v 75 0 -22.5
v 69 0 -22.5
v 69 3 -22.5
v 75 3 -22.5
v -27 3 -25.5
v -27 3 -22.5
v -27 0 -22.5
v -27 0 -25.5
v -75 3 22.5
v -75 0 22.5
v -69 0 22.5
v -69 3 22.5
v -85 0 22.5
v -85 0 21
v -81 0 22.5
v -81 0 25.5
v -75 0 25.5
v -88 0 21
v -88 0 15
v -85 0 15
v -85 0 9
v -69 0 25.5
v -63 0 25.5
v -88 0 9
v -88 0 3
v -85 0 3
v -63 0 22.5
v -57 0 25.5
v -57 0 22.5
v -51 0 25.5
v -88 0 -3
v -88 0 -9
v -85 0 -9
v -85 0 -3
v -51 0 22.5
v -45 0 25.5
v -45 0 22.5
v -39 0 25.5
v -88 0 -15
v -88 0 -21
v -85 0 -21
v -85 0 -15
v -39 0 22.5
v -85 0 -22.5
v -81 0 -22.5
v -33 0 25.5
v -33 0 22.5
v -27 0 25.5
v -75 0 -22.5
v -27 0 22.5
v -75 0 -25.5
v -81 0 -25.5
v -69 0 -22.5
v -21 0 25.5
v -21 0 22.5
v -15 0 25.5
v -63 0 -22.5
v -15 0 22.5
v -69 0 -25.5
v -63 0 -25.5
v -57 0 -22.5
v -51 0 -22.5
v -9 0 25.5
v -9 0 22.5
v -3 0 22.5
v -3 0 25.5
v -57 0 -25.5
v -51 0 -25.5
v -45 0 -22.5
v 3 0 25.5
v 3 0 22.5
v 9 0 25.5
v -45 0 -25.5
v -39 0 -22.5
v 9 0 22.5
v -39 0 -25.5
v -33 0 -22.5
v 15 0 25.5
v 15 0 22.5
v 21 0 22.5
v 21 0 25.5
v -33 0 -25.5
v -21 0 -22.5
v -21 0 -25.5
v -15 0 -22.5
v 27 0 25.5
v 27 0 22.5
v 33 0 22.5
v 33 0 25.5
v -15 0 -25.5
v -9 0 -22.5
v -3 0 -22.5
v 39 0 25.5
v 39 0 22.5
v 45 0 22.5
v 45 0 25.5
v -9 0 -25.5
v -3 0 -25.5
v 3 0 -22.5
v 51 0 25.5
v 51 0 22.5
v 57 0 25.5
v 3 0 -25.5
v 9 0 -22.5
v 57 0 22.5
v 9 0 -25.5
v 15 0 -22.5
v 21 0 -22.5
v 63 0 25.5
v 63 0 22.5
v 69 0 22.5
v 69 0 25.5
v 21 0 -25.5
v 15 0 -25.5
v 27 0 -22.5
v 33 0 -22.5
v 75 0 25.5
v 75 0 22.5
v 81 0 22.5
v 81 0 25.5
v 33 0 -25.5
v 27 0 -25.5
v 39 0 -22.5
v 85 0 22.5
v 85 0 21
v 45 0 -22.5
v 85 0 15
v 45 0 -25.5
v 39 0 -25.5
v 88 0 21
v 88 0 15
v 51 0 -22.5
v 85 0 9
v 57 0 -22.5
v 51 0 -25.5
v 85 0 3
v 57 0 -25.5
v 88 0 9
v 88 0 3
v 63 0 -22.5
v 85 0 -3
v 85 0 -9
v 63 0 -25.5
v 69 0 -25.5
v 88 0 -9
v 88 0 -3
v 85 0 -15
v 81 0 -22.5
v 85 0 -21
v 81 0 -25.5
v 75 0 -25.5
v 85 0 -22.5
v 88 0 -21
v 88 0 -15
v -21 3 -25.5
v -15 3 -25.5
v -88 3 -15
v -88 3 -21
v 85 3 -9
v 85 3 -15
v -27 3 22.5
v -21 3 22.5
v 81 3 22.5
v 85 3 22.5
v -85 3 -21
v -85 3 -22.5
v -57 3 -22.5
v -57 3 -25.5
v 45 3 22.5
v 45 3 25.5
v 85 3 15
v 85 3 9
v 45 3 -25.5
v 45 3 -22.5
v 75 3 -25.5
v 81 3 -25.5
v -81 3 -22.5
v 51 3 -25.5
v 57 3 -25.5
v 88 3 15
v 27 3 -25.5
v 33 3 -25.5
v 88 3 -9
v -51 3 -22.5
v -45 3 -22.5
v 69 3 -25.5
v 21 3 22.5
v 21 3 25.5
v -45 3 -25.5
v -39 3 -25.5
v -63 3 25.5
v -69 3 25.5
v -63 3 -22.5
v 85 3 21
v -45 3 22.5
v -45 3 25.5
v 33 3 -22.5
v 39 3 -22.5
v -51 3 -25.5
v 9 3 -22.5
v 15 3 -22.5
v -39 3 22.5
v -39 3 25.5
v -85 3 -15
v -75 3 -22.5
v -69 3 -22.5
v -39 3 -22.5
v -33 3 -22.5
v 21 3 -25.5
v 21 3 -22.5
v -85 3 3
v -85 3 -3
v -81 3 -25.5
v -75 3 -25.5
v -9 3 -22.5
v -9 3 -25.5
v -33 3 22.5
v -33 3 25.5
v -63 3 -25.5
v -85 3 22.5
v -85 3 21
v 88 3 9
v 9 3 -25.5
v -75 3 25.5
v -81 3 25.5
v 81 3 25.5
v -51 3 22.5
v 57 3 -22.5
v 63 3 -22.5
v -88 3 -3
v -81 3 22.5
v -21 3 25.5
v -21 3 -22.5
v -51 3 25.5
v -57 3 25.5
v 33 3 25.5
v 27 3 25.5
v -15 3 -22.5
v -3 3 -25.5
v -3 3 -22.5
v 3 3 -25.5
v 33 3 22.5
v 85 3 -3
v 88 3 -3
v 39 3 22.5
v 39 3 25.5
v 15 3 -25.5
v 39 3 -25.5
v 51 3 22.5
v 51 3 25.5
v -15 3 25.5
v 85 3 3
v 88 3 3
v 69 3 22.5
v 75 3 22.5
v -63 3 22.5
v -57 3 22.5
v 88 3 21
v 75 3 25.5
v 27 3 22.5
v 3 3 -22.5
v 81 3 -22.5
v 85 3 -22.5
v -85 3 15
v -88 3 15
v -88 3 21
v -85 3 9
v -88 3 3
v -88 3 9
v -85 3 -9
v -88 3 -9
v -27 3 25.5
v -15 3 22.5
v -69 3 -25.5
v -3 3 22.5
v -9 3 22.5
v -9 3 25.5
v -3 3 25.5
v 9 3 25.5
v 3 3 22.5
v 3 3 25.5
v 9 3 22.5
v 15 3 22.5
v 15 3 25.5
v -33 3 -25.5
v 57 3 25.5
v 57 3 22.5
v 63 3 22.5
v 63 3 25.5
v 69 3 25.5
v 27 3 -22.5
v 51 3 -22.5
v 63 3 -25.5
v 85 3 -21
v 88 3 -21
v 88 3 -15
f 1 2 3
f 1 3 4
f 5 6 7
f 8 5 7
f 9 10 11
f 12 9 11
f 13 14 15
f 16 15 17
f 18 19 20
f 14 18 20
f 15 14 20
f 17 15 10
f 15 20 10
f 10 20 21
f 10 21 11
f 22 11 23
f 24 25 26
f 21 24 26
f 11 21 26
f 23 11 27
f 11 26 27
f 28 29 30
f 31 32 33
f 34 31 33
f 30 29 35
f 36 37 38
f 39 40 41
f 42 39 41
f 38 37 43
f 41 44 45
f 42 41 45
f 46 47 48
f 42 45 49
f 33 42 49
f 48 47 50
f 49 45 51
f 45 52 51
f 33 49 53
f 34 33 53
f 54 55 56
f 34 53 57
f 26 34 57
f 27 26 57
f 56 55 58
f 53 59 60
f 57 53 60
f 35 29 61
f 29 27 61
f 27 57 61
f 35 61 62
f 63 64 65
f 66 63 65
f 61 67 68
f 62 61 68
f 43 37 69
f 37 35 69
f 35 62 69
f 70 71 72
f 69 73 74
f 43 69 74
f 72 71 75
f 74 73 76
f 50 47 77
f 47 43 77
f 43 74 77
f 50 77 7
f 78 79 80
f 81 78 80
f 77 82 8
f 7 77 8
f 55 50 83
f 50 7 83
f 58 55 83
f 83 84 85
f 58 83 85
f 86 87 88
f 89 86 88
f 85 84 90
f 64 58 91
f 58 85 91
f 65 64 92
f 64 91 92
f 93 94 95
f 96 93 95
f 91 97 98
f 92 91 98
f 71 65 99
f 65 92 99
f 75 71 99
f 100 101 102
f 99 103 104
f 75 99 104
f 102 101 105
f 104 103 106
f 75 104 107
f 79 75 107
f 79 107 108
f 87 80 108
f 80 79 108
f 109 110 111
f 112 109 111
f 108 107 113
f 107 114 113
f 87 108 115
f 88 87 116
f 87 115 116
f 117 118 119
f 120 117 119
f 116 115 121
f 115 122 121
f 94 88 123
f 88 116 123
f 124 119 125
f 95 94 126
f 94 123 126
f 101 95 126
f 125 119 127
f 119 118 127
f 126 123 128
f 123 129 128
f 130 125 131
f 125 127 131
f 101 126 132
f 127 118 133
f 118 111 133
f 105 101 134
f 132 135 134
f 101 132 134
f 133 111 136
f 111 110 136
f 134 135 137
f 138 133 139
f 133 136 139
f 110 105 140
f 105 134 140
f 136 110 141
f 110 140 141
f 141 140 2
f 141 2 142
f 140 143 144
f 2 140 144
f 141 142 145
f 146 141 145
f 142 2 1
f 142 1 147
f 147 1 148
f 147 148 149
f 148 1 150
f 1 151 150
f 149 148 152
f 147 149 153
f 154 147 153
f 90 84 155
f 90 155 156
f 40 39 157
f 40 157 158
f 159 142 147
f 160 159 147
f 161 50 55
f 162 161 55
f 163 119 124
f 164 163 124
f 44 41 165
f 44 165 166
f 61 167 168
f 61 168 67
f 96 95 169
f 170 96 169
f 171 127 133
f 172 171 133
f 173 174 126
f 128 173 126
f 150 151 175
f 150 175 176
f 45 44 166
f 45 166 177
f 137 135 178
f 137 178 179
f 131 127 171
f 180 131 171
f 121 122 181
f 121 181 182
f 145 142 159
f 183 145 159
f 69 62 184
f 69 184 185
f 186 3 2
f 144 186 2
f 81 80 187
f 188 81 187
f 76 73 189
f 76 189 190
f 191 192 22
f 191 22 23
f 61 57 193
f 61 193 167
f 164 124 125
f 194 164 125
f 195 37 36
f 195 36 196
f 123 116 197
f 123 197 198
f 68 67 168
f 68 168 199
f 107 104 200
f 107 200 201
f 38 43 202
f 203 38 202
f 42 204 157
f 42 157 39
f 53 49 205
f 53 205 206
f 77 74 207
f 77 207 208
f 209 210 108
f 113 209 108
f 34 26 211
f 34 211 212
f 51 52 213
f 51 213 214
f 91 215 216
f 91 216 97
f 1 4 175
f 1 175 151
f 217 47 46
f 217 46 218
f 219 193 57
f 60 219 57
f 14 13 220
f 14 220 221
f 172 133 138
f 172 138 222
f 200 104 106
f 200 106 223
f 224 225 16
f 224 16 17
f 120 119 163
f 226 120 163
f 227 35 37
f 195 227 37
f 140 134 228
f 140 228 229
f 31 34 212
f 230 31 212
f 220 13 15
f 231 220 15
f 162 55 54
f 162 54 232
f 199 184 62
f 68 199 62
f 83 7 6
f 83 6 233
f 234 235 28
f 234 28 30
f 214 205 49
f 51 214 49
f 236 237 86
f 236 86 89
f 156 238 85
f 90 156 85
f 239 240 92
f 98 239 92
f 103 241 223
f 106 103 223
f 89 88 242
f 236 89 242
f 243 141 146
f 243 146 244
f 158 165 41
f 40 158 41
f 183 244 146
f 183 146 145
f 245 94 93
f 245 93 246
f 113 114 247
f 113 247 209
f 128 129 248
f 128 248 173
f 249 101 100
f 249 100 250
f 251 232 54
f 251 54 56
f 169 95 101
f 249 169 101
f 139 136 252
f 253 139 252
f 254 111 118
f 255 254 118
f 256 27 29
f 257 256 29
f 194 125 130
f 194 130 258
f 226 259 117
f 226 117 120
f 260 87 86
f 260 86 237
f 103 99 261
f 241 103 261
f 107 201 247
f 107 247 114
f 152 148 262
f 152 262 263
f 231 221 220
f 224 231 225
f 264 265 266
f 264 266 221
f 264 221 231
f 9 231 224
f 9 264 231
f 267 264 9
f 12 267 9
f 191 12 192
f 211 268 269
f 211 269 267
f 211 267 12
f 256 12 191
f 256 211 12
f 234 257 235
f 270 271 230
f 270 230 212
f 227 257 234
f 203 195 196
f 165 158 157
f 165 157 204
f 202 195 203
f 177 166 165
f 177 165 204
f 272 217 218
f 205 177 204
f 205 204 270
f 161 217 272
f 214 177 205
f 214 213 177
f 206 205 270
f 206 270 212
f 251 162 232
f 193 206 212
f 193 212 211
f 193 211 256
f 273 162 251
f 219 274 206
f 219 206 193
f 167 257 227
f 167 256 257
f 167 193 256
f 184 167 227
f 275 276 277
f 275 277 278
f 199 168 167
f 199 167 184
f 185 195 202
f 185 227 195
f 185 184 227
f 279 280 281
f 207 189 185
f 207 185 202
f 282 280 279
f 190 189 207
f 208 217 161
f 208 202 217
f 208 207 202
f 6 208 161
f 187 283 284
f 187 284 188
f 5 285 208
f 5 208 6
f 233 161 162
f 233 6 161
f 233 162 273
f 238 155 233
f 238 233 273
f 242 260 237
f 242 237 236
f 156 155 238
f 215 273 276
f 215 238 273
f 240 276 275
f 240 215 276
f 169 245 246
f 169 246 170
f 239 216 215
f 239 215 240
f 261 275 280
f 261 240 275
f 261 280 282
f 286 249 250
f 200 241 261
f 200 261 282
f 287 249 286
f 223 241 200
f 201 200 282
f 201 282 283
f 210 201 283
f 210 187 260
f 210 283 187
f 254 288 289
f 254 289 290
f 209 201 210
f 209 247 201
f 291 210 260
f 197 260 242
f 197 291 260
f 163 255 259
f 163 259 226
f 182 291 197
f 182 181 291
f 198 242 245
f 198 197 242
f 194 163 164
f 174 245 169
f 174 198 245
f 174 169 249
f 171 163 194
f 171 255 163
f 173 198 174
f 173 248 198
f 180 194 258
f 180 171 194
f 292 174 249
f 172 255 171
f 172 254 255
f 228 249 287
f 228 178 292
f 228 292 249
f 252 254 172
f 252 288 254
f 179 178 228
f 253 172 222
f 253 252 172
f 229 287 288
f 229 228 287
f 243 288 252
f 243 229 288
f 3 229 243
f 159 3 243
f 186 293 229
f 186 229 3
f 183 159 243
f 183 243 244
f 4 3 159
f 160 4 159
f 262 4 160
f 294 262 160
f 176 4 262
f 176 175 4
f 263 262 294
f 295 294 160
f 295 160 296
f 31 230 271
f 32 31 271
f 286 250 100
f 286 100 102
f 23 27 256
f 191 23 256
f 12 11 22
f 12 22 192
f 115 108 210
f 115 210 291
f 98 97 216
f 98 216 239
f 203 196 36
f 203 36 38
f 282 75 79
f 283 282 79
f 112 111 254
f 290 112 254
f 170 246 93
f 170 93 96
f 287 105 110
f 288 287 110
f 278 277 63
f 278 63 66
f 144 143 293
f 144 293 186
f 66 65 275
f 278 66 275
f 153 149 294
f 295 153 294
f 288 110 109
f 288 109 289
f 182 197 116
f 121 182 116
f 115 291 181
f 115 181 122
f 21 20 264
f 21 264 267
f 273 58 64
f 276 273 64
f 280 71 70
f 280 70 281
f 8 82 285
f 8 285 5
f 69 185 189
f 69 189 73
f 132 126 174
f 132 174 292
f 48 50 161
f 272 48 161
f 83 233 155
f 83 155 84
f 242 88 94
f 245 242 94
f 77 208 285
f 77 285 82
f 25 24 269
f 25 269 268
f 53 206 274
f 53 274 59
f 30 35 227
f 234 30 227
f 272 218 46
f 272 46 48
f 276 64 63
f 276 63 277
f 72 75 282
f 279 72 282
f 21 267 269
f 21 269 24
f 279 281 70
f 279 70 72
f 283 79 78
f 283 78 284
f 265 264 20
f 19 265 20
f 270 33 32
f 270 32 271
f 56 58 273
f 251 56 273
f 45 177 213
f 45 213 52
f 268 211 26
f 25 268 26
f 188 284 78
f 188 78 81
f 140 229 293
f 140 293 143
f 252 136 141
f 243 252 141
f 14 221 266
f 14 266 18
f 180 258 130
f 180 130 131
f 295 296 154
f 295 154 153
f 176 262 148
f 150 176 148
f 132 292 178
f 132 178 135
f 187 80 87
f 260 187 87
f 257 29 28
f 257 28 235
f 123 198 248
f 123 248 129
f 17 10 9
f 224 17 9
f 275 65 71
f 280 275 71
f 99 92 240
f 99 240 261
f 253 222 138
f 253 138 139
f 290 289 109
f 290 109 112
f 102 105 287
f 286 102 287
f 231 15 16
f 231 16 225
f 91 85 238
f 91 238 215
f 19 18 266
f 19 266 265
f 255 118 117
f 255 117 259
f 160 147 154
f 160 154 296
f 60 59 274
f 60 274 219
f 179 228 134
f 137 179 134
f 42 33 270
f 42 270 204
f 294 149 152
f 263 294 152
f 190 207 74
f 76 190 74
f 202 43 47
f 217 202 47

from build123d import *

# Parameters (mm, degrees)
SKETCH1_W                = 170
SKETCH1_H                = 45
BOSS_EXTRUDE1_DEPTH      = 3
SKETCH2_W                = 6
SKETCH2_H                = 3
BOSS_EXTRUDE2_DEPTH      = 3
LPATTERN1_COUNT          = 7
LPATTERN1_PITCH          = 12
LPATTERN1_COL_COUNT      = 8
LPATTERN1_COL_PITCH      = 12
SKETCH3_W                = 6
SKETCH3_H                = 3
BOSS_EXTRUDE3_DEPTH      = 3
LPATTERN2_COUNT          = 2
LPATTERN2_PITCH          = 12
LPATTERN2_COL_COUNT      = 3
LPATTERN2_COL_PITCH      = 12
MIRROR1_COPY_1_SKETCH_W  = 6
MIRROR1_COPY_1_SKETCH_H  = 3
MIRROR1_COPY_1_DEPTH     = 3
MIRROR1_COPY_2_SKETCH_W  = 6
MIRROR1_COPY_2_SKETCH_H  = 3
MIRROR1_COPY_2_DEPTH     = 3
MIRROR1_COPY_3_SKETCH_W  = 6
MIRROR1_COPY_3_SKETCH_H  = 3
MIRROR1_COPY_3_DEPTH     = 3
MIRROR1_COPY_4_SKETCH_W  = 6
MIRROR1_COPY_4_SKETCH_H  = 3
MIRROR1_COPY_4_DEPTH     = 3
MIRROR1_COPY_5_SKETCH_W  = 6
MIRROR1_COPY_5_SKETCH_H  = 3
MIRROR1_COPY_5_DEPTH     = 3
MIRROR1_COPY_6_SKETCH_W  = 6
MIRROR1_COPY_6_SKETCH_H  = 3
MIRROR1_COPY_6_DEPTH     = 3
MIRROR1_COPY_7_SKETCH_W  = 6
MIRROR1_COPY_7_SKETCH_H  = 3
MIRROR1_COPY_7_DEPTH     = 3
MIRROR1_COPY_8_SKETCH_W  = 6
MIRROR1_COPY_8_SKETCH_H  = 3
MIRROR1_COPY_8_DEPTH     = 3
MIRROR1_COPY_9_SKETCH_W  = 6
MIRROR1_COPY_9_SKETCH_H  = 3
MIRROR1_COPY_9_DEPTH     = 3
MIRROR1_COPY_10_SKETCH_W = 6
MIRROR1_COPY_10_SKETCH_H = 3
MIRROR1_COPY_10_DEPTH    = 3
MIRROR1_COPY_11_SKETCH_W = 6
MIRROR1_COPY_11_SKETCH_H = 3
MIRROR1_COPY_11_DEPTH    = 3
MIRROR1_COPY_12_SKETCH_W = 6
MIRROR1_COPY_12_SKETCH_H = 3
MIRROR1_COPY_12_DEPTH    = 3
MIRROR1_COPY_13_SKETCH_W = 6
MIRROR1_COPY_13_SKETCH_H = 3
MIRROR1_COPY_13_DEPTH    = 3
MIRROR2_COPY_1_SKETCH_W  = 6
MIRROR2_COPY_1_SKETCH_H  = 3
MIRROR2_COPY_1_DEPTH     = 3
MIRROR2_COPY_2_SKETCH_W  = 6
MIRROR2_COPY_2_SKETCH_H  = 3
MIRROR2_COPY_2_DEPTH     = 3
MIRROR2_COPY_3_SKETCH_W  = 6
MIRROR2_COPY_3_SKETCH_H  = 3
MIRROR2_COPY_3_DEPTH     = 3


with BuildPart() as part:
    # Sketch1 → Boss-Extrude1 (new body)
    with BuildSketch(Plane(origin=(0, 0, 0), x_dir=(1, 0, 0), z_dir=(0, 1, 0))):
        Rectangle(SKETCH1_W, SKETCH1_H)
    extrude(amount=BOSS_EXTRUDE1_DEPTH)

    # Sketch2 → Boss-Extrude2 (add)
    with BuildSketch(Plane.XY.offset(22.5)):
        with Locations((6, 1.5)):
            Rectangle(SKETCH2_W, SKETCH2_H)
    boss_extrude2 = extrude(amount=BOSS_EXTRUDE2_DEPTH)

    # LPattern1: Boss-Extrude2 ×7
    with Locations(*[(i * LPATTERN1_PITCH, 0, 0) for i in range(1, LPATTERN1_COUNT)]):
        add(boss_extrude2)

    # LPattern1 col: Boss-Extrude2 ×8
    with Locations(*[(-i * LPATTERN1_COL_PITCH, 0, 0) for i in range(1, LPATTERN1_COL_COUNT)]):
        add(boss_extrude2)

    # Sketch3 → Boss-Extrude3 (add)
    with BuildSketch(Plane(origin=(85, 0, 0), x_dir=(0, 0, -1), z_dir=(1, 0, 0))):
        with Locations((6, 1.5)):
            Rectangle(SKETCH3_W, SKETCH3_H)
    boss_extrude3 = extrude(amount=BOSS_EXTRUDE3_DEPTH)

    # LPattern2: Boss-Extrude3 ×2
    with Locations(*[(0, 0, -i * LPATTERN2_PITCH) for i in range(1, LPATTERN2_COUNT)]):
        add(boss_extrude3)

    # LPattern2 col: Boss-Extrude3 ×3
    with Locations(*[(0, 0, i * LPATTERN2_COL_PITCH) for i in range(1, LPATTERN2_COL_COUNT)]):
        add(boss_extrude3)

    # Mirror1: Boss-Extrude2 across plane
    add(boss_extrude2.mirror(Plane(origin=(0, 0, 0), x_dir=(1, 0, 0), z_dir=(0, 0, -1))))

    # Mirror1 copy 1 sketch → Mirror1 copy 1 (add)
    with BuildSketch(Plane(origin=(12, 0, -22.5), x_dir=(1, 0, 0), z_dir=(0, 0, -1))):
        with Locations((6, -1.5)):
            Rectangle(MIRROR1_COPY_1_SKETCH_W, MIRROR1_COPY_1_SKETCH_H)
    extrude(amount=MIRROR1_COPY_1_DEPTH)

    # Mirror1 copy 2 sketch → Mirror1 copy 2 (add)
    with BuildSketch(Plane(origin=(24, 0, -22.5), x_dir=(1, 0, 0), z_dir=(0, 0, -1))):
        with Locations((6, -1.5)):
            Rectangle(MIRROR1_COPY_2_SKETCH_W, MIRROR1_COPY_2_SKETCH_H)
    extrude(amount=MIRROR1_COPY_2_DEPTH)

    # Mirror1 copy 3 sketch → Mirror1 copy 3 (add)
    with BuildSketch(Plane(origin=(36, 0, -22.5), x_dir=(1, 0, 0), z_dir=(0, 0, -1))):
        with Locations((6, -1.5)):
            Rectangle(MIRROR1_COPY_3_SKETCH_W, MIRROR1_COPY_3_SKETCH_H)
    extrude(amount=MIRROR1_COPY_3_DEPTH)

    # Mirror1 copy 4 sketch → Mirror1 copy 4 (add)
    with BuildSketch(Plane(origin=(48, 0, -22.5), x_dir=(1, 0, 0), z_dir=(0, 0, -1))):
        with Locations((6, -1.5)):
            Rectangle(MIRROR1_COPY_4_SKETCH_W, MIRROR1_COPY_4_SKETCH_H)
    extrude(amount=MIRROR1_COPY_4_DEPTH)

    # Mirror1 copy 5 sketch → Mirror1 copy 5 (add)
    with BuildSketch(Plane(origin=(60, 0, -22.5), x_dir=(1, 0, 0), z_dir=(0, 0, -1))):
        with Locations((6, -1.5)):
            Rectangle(MIRROR1_COPY_5_SKETCH_W, MIRROR1_COPY_5_SKETCH_H)
    extrude(amount=MIRROR1_COPY_5_DEPTH)

    # Mirror1 copy 6 sketch → Mirror1 copy 6 (add)
    with BuildSketch(Plane(origin=(72, 0, -22.5), x_dir=(1, 0, 0), z_dir=(0, 0, -1))):
        with Locations((6, -1.5)):
            Rectangle(MIRROR1_COPY_6_SKETCH_W, MIRROR1_COPY_6_SKETCH_H)
    extrude(amount=MIRROR1_COPY_6_DEPTH)

    # Mirror1 copy 7 sketch → Mirror1 copy 7 (add)
    with BuildSketch(Plane(origin=(-12, 0, -22.5), x_dir=(1, 0, 0), z_dir=(0, 0, -1))):
        with Locations((6, -1.5)):
            Rectangle(MIRROR1_COPY_7_SKETCH_W, MIRROR1_COPY_7_SKETCH_H)
    extrude(amount=MIRROR1_COPY_7_DEPTH)

    # Mirror1 copy 8 sketch → Mirror1 copy 8 (add)
    with BuildSketch(Plane(origin=(-24, 0, -22.5), x_dir=(1, 0, 0), z_dir=(0, 0, -1))):
        with Locations((6, -1.5)):
            Rectangle(MIRROR1_COPY_8_SKETCH_W, MIRROR1_COPY_8_SKETCH_H)
    extrude(amount=MIRROR1_COPY_8_DEPTH)

    # Mirror1 copy 9 sketch → Mirror1 copy 9 (add)
    with BuildSketch(Plane(origin=(-36, 0, -22.5), x_dir=(1, 0, 0), z_dir=(0, 0, -1))):
        with Locations((6, -1.5)):
            Rectangle(MIRROR1_COPY_9_SKETCH_W, MIRROR1_COPY_9_SKETCH_H)
    extrude(amount=MIRROR1_COPY_9_DEPTH)

    # Mirror1 copy 10 sketch → Mirror1 copy 10 (add)
    with BuildSketch(Plane(origin=(-48, 0, -22.5), x_dir=(1, 0, 0), z_dir=(0, 0, -1))):
        with Locations((6, -1.5)):
            Rectangle(MIRROR1_COPY_10_SKETCH_W, MIRROR1_COPY_10_SKETCH_H)
    extrude(amount=MIRROR1_COPY_10_DEPTH)

    # Mirror1 copy 11 sketch → Mirror1 copy 11 (add)
    with BuildSketch(Plane(origin=(-60, 0, -22.5), x_dir=(1, 0, 0), z_dir=(0, 0, -1))):
        with Locations((6, -1.5)):
            Rectangle(MIRROR1_COPY_11_SKETCH_W, MIRROR1_COPY_11_SKETCH_H)
    extrude(amount=MIRROR1_COPY_11_DEPTH)

    # Mirror1 copy 12 sketch → Mirror1 copy 12 (add)
    with BuildSketch(Plane(origin=(-72, 0, -22.5), x_dir=(1, 0, 0), z_dir=(0, 0, -1))):
        with Locations((6, -1.5)):
            Rectangle(MIRROR1_COPY_12_SKETCH_W, MIRROR1_COPY_12_SKETCH_H)
    extrude(amount=MIRROR1_COPY_12_DEPTH)

    # Mirror1 copy 13 sketch → Mirror1 copy 13 (add)
    with BuildSketch(Plane(origin=(-84, 0, -22.5), x_dir=(1, 0, 0), z_dir=(0, 0, -1))):
        with Locations((6, -1.5)):
            Rectangle(MIRROR1_COPY_13_SKETCH_W, MIRROR1_COPY_13_SKETCH_H)
    extrude(amount=MIRROR1_COPY_13_DEPTH)

    # Mirror2: Boss-Extrude3 across plane
    add(boss_extrude3.mirror(Plane.ZY))

    # Mirror2 copy 1 sketch → Mirror2 copy 1 (add)
    with BuildSketch(Plane(origin=(-85, 0, -12), x_dir=(0, 0, -1), z_dir=(-1, 0, 0))):
        with Locations((6, -1.5)):
            Rectangle(MIRROR2_COPY_1_SKETCH_W, MIRROR2_COPY_1_SKETCH_H)
    extrude(amount=MIRROR2_COPY_1_DEPTH)

    # Mirror2 copy 2 sketch → Mirror2 copy 2 (add)
    with BuildSketch(Plane(origin=(-85, 0, 12), x_dir=(0, 0, -1), z_dir=(-1, 0, 0))):
        with Locations((6, -1.5)):
            Rectangle(MIRROR2_COPY_2_SKETCH_W, MIRROR2_COPY_2_SKETCH_H)
    extrude(amount=MIRROR2_COPY_2_DEPTH)

    # Mirror2 copy 3 sketch → Mirror2 copy 3 (add)
    with BuildSketch(Plane(origin=(-85, 0, 24), x_dir=(0, 0, -1), z_dir=(-1, 0, 0))):
        with Locations((6, -1.5)):
            Rectangle(MIRROR2_COPY_3_SKETCH_W, MIRROR2_COPY_3_SKETCH_H)
    extrude(amount=MIRROR2_COPY_3_DEPTH)


solid = part.part
